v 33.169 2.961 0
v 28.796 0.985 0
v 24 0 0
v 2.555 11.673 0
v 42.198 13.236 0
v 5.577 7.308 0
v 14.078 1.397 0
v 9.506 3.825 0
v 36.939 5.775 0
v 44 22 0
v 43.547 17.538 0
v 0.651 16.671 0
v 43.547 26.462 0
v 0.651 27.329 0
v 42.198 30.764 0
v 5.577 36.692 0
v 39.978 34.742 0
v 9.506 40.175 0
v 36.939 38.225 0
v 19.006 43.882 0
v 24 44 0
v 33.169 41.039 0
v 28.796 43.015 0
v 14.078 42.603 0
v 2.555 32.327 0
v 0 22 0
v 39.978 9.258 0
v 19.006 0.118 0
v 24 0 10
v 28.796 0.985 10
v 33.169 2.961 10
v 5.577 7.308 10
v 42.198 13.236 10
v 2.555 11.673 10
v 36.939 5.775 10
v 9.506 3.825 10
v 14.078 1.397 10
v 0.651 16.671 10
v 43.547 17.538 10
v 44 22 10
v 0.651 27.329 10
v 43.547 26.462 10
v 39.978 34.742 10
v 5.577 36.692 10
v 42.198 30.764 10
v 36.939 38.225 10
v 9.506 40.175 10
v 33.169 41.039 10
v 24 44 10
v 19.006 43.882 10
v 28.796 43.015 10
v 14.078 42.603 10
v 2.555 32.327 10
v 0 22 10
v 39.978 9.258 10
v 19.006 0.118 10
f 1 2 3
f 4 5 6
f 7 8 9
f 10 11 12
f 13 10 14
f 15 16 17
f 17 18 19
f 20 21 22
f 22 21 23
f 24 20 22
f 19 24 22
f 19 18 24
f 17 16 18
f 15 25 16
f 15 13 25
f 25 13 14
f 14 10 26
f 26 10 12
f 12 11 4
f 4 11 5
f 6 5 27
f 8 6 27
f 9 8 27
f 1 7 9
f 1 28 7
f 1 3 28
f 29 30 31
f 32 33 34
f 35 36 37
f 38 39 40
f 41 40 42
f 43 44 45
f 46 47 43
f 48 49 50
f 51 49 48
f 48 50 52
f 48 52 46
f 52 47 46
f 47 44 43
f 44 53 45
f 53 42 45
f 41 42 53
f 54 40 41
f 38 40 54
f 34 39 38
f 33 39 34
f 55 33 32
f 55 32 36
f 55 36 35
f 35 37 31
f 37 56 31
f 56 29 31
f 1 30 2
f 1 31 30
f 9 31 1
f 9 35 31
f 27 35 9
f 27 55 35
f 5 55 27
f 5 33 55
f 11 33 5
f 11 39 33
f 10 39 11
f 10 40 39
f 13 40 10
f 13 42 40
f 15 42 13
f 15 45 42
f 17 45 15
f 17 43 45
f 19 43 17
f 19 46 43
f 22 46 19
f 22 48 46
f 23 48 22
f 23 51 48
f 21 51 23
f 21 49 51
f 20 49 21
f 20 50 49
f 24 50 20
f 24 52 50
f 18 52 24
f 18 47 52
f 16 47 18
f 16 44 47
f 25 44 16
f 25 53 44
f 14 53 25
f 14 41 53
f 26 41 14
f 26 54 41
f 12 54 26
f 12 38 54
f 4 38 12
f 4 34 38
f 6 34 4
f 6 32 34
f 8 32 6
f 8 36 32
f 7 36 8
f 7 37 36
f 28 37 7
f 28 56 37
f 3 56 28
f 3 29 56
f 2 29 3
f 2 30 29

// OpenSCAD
$fn = 32;

// ----------------------------------------------------------------------
// Cam disc: base radius 20.0 mm, lift 4.0 mm, 28 profile points
// ----------------------------------------------------------------------

// --- parameters (mm) ---
profile_height = 10;      // extrusion height
profile_points = 28;      // points of the closed outline

profile = [[44, 22], [43.547, 26.462], [42.198, 30.764], [39.978, 34.742], [36.939, 38.225], [33.169, 41.039], [28.796, 43.015], [24, 44], [19.006, 43.882], [14.078, 42.603], [9.506, 40.175], [5.577, 36.692], [2.555, 32.327], [0.651, 27.329], [0, 22], [0.651, 16.671], [2.555, 11.673], [5.577, 7.308], [9.506, 3.825], [14.078, 1.397], [19.006, 0.118], [24, 0], [28.796, 0.985], [33.169, 2.961], [36.939, 5.775], [39.978, 9.258], [42.198, 13.236], [43.547, 17.538]];  // single closed polygon, 28 points, counter clockwise

// --- the one profile operation ---
linear_extrude(height = profile_height) polygon(points = profile);
